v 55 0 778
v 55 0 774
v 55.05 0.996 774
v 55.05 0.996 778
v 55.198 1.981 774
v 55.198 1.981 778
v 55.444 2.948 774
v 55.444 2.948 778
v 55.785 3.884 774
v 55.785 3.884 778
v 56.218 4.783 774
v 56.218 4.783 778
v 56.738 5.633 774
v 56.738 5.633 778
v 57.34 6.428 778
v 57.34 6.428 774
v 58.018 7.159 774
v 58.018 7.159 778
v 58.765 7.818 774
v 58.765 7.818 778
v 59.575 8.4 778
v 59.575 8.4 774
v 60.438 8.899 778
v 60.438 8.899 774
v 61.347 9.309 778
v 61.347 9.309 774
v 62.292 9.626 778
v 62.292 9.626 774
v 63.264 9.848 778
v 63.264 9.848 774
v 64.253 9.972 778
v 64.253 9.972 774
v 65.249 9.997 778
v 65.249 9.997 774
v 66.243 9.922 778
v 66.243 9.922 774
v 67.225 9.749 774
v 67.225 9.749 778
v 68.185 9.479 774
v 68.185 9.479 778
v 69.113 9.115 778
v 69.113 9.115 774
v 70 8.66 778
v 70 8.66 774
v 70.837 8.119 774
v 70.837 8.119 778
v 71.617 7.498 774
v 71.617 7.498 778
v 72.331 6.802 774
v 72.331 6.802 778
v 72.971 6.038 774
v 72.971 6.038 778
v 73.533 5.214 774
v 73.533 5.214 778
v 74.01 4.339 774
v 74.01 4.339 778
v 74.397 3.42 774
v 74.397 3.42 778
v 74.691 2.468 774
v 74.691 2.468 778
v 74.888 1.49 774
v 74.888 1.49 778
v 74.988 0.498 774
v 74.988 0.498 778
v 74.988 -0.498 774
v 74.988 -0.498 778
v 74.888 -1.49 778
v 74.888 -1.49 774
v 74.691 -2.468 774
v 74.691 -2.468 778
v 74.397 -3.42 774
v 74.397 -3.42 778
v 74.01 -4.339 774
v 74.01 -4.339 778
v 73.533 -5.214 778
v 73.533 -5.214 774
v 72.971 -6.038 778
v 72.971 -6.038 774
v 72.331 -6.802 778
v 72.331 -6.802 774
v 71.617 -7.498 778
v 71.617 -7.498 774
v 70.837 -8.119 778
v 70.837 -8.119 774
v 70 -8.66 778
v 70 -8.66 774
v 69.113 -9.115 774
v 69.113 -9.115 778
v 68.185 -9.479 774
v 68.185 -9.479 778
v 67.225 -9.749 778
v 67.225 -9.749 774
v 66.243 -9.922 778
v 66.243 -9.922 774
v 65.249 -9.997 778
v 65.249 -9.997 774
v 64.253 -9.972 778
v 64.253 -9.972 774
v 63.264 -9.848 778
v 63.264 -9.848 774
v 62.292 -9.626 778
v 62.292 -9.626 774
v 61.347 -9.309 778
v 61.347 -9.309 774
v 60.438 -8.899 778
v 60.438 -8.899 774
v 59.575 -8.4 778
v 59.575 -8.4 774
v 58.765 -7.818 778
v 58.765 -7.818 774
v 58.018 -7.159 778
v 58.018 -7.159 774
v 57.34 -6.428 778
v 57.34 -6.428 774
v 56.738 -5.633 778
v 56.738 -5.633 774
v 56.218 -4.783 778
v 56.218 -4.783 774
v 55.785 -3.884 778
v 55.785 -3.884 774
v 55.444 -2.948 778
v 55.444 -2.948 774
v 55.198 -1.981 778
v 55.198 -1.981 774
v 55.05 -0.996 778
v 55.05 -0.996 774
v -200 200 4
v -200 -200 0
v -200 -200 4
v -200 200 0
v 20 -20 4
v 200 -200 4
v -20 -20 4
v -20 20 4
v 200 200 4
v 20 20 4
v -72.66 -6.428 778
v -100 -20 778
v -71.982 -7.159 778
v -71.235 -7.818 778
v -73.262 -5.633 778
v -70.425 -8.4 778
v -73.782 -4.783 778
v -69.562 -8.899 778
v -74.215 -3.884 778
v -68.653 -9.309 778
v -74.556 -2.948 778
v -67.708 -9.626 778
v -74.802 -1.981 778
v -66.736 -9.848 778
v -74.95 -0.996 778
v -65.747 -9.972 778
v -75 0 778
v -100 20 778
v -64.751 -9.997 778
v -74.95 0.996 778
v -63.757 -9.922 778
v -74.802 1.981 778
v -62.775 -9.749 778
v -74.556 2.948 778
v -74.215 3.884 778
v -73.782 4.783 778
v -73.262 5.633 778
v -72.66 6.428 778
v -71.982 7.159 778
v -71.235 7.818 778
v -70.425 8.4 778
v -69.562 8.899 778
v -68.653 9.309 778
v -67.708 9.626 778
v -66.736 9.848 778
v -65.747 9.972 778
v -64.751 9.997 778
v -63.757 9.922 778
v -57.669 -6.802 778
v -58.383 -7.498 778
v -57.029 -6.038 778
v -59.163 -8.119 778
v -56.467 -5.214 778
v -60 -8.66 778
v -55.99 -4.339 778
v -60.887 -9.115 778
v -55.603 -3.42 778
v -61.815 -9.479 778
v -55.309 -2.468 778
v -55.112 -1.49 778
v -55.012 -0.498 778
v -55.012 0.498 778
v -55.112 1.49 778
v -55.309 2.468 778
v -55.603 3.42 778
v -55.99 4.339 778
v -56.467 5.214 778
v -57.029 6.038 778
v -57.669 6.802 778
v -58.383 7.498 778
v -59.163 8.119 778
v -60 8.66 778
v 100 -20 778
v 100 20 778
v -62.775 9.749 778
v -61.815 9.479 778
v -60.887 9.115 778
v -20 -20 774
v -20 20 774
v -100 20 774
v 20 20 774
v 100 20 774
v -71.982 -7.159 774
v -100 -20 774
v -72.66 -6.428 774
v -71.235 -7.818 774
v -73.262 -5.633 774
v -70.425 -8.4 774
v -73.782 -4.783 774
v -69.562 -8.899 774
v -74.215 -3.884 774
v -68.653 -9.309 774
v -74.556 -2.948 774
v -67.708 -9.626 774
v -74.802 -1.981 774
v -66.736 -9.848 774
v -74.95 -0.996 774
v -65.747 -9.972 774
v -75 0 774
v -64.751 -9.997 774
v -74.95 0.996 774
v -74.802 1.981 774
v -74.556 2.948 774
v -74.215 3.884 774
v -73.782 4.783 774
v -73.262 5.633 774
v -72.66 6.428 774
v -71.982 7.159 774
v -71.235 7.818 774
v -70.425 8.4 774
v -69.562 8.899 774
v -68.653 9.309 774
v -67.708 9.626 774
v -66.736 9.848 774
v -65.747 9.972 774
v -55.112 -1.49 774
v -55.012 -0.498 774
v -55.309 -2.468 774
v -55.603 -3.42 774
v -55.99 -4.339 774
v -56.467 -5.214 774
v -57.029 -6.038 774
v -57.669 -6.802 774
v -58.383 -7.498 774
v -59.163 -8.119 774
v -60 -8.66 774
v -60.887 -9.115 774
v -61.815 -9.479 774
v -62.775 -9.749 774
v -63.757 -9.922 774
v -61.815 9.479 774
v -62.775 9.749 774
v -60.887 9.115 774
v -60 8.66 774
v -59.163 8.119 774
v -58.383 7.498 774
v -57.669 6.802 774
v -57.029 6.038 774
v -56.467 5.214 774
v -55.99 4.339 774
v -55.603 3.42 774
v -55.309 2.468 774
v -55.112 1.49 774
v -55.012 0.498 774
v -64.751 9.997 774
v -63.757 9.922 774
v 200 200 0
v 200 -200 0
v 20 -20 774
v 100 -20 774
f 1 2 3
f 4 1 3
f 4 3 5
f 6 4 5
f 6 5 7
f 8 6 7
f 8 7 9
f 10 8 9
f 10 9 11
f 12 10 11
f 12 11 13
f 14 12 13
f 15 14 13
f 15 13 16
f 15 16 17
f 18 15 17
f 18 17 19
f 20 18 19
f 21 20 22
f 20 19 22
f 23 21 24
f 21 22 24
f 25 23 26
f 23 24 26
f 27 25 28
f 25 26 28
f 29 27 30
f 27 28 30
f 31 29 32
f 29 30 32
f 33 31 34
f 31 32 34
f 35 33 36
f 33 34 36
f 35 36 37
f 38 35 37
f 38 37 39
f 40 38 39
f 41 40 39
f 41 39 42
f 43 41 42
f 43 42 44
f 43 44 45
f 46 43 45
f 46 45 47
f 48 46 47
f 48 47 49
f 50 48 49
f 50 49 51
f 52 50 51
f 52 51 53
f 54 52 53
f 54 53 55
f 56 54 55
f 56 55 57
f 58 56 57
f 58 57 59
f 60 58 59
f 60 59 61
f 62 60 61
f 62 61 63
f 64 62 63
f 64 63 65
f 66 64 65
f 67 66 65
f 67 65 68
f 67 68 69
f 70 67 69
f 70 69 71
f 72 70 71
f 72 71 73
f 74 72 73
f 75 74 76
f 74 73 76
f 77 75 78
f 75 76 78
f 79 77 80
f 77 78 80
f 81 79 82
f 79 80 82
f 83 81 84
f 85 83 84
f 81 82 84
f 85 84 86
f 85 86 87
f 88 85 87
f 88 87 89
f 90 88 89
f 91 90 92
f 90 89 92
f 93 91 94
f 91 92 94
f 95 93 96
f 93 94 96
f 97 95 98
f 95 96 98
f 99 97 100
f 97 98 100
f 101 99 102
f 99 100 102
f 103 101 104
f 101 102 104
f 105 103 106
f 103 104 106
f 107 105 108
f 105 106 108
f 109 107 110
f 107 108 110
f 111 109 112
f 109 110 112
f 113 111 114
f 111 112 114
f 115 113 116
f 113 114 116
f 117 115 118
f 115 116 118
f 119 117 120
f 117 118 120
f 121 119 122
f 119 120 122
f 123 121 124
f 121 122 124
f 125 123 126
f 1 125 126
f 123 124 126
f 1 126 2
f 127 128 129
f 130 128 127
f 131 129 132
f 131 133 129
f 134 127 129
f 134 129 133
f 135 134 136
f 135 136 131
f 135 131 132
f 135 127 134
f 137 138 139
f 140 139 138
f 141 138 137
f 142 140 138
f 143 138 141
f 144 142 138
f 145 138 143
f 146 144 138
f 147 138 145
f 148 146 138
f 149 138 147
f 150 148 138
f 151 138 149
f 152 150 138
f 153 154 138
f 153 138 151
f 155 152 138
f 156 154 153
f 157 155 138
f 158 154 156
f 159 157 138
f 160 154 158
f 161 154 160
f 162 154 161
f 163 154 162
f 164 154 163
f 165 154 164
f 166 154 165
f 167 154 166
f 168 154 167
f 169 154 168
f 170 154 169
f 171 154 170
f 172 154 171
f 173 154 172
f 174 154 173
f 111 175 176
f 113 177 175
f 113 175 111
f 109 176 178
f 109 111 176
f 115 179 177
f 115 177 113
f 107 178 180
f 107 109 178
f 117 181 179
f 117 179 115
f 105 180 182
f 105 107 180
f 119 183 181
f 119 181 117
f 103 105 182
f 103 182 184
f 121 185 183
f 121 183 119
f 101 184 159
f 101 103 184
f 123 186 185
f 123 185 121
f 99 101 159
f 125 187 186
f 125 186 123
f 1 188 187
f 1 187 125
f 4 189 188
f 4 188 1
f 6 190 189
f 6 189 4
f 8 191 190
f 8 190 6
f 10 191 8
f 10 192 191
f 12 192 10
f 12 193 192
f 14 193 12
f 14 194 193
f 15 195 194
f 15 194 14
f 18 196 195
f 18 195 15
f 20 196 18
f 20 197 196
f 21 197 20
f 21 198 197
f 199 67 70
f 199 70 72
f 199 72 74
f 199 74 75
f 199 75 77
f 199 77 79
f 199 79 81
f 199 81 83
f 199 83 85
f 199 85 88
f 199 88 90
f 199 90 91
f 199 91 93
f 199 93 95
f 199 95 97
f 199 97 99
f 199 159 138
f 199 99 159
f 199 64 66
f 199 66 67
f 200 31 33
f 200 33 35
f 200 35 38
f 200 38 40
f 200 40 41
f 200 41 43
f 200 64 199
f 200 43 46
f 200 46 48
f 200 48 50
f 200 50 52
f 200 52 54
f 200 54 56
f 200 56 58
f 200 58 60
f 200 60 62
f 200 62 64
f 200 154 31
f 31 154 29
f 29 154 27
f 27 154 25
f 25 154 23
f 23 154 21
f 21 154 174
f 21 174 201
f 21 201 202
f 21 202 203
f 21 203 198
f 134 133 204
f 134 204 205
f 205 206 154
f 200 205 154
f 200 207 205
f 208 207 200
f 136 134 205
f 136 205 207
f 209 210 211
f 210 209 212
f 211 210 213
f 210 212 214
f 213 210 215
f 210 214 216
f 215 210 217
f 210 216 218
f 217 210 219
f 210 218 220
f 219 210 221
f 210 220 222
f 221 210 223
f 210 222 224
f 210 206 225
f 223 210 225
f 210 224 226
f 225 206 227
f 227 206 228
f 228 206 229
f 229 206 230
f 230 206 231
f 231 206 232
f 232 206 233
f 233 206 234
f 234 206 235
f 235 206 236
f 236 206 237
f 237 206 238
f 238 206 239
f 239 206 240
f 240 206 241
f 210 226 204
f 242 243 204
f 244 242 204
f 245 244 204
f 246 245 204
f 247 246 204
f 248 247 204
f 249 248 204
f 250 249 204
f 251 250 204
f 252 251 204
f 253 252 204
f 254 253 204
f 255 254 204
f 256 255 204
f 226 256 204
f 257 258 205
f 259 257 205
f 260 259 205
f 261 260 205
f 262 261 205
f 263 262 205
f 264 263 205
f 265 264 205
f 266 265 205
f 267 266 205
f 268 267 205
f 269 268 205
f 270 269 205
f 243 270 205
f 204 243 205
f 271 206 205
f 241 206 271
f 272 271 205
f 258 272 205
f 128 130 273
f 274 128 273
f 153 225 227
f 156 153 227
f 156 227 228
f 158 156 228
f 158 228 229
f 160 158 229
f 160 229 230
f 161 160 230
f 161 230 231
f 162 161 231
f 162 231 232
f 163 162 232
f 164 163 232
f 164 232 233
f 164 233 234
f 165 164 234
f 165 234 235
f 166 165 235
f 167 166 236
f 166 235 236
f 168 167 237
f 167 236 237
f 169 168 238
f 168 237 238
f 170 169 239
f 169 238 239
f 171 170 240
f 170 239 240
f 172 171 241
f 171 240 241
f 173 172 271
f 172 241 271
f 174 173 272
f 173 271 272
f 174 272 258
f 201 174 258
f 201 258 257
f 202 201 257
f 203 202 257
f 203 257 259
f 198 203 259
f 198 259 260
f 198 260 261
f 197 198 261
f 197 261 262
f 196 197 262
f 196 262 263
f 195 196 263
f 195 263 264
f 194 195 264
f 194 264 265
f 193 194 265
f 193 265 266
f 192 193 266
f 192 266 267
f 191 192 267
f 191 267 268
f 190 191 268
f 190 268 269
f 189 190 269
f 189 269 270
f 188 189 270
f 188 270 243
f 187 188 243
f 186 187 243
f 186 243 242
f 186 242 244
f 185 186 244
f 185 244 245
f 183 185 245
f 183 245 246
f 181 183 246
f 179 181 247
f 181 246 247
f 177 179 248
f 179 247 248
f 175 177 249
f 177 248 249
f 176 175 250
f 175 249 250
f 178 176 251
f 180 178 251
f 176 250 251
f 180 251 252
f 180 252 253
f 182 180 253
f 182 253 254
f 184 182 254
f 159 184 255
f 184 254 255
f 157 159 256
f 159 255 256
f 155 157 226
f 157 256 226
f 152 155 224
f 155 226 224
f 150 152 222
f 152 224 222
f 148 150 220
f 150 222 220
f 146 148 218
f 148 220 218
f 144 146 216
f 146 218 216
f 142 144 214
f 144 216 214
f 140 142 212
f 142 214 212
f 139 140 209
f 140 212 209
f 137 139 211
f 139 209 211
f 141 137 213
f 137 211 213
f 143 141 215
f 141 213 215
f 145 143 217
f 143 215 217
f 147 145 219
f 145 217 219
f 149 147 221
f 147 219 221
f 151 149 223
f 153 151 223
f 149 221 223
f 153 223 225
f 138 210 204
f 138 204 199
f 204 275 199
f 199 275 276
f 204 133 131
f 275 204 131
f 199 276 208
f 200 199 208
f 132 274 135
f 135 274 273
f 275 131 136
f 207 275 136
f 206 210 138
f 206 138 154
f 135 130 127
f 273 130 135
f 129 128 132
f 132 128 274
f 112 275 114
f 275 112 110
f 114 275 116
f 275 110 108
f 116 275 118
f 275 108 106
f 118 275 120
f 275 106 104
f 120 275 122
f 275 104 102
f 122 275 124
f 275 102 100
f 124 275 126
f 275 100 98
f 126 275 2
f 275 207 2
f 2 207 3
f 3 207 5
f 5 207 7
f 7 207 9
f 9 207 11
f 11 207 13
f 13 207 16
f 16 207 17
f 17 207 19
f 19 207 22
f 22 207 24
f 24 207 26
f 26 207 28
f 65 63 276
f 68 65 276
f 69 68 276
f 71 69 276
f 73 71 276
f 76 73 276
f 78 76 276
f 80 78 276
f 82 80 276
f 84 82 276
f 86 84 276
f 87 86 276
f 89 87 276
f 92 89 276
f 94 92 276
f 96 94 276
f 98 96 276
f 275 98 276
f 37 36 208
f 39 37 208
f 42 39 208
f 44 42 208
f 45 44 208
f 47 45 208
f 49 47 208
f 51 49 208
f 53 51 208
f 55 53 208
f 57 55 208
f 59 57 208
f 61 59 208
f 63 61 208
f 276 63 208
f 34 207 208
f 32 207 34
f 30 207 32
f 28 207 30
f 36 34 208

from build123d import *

# Parameters (mm, degrees)
F0_W     = 400
F0_H     = 400
F1_DEPTH = 4
F2_W     = 40
F2_H     = 40
F3_DEPTH = 770
F4_W     = 200
F4_H     = 40
F5_DEPTH = 4
F8_D     = 20
F8_DEPTH = 20
F9_D     = 20
F9_DEPTH = 20


with BuildPart() as f1:
    # F0 (on Top) → F1 (new body)
    with BuildSketch(Plane.XY):
        Rectangle(F0_W, F0_H)
    extrude(amount=F1_DEPTH)

    # F2 (on face) → F3 (join)
    with BuildSketch(Plane.XY.offset(4)):
        Rectangle(F2_W, F2_H)
    extrude(amount=F3_DEPTH)

    # F4 (on face) → F5 (join)
    with BuildSketch(Plane.XY.offset(774)):
        Rectangle(F4_W, F4_H)
    extrude(amount=F5_DEPTH)

    # F8
    with Locations(Plane.XY.offset(778)):
        with Locations((-65, 0)):
            Hole(F8_D / 2, depth=F8_DEPTH)

    # F9
    with Locations(Plane.XY.offset(778)):
        with Locations((65, 0)):
            Hole(F9_D / 2, depth=F9_DEPTH)


solid = f1.part
